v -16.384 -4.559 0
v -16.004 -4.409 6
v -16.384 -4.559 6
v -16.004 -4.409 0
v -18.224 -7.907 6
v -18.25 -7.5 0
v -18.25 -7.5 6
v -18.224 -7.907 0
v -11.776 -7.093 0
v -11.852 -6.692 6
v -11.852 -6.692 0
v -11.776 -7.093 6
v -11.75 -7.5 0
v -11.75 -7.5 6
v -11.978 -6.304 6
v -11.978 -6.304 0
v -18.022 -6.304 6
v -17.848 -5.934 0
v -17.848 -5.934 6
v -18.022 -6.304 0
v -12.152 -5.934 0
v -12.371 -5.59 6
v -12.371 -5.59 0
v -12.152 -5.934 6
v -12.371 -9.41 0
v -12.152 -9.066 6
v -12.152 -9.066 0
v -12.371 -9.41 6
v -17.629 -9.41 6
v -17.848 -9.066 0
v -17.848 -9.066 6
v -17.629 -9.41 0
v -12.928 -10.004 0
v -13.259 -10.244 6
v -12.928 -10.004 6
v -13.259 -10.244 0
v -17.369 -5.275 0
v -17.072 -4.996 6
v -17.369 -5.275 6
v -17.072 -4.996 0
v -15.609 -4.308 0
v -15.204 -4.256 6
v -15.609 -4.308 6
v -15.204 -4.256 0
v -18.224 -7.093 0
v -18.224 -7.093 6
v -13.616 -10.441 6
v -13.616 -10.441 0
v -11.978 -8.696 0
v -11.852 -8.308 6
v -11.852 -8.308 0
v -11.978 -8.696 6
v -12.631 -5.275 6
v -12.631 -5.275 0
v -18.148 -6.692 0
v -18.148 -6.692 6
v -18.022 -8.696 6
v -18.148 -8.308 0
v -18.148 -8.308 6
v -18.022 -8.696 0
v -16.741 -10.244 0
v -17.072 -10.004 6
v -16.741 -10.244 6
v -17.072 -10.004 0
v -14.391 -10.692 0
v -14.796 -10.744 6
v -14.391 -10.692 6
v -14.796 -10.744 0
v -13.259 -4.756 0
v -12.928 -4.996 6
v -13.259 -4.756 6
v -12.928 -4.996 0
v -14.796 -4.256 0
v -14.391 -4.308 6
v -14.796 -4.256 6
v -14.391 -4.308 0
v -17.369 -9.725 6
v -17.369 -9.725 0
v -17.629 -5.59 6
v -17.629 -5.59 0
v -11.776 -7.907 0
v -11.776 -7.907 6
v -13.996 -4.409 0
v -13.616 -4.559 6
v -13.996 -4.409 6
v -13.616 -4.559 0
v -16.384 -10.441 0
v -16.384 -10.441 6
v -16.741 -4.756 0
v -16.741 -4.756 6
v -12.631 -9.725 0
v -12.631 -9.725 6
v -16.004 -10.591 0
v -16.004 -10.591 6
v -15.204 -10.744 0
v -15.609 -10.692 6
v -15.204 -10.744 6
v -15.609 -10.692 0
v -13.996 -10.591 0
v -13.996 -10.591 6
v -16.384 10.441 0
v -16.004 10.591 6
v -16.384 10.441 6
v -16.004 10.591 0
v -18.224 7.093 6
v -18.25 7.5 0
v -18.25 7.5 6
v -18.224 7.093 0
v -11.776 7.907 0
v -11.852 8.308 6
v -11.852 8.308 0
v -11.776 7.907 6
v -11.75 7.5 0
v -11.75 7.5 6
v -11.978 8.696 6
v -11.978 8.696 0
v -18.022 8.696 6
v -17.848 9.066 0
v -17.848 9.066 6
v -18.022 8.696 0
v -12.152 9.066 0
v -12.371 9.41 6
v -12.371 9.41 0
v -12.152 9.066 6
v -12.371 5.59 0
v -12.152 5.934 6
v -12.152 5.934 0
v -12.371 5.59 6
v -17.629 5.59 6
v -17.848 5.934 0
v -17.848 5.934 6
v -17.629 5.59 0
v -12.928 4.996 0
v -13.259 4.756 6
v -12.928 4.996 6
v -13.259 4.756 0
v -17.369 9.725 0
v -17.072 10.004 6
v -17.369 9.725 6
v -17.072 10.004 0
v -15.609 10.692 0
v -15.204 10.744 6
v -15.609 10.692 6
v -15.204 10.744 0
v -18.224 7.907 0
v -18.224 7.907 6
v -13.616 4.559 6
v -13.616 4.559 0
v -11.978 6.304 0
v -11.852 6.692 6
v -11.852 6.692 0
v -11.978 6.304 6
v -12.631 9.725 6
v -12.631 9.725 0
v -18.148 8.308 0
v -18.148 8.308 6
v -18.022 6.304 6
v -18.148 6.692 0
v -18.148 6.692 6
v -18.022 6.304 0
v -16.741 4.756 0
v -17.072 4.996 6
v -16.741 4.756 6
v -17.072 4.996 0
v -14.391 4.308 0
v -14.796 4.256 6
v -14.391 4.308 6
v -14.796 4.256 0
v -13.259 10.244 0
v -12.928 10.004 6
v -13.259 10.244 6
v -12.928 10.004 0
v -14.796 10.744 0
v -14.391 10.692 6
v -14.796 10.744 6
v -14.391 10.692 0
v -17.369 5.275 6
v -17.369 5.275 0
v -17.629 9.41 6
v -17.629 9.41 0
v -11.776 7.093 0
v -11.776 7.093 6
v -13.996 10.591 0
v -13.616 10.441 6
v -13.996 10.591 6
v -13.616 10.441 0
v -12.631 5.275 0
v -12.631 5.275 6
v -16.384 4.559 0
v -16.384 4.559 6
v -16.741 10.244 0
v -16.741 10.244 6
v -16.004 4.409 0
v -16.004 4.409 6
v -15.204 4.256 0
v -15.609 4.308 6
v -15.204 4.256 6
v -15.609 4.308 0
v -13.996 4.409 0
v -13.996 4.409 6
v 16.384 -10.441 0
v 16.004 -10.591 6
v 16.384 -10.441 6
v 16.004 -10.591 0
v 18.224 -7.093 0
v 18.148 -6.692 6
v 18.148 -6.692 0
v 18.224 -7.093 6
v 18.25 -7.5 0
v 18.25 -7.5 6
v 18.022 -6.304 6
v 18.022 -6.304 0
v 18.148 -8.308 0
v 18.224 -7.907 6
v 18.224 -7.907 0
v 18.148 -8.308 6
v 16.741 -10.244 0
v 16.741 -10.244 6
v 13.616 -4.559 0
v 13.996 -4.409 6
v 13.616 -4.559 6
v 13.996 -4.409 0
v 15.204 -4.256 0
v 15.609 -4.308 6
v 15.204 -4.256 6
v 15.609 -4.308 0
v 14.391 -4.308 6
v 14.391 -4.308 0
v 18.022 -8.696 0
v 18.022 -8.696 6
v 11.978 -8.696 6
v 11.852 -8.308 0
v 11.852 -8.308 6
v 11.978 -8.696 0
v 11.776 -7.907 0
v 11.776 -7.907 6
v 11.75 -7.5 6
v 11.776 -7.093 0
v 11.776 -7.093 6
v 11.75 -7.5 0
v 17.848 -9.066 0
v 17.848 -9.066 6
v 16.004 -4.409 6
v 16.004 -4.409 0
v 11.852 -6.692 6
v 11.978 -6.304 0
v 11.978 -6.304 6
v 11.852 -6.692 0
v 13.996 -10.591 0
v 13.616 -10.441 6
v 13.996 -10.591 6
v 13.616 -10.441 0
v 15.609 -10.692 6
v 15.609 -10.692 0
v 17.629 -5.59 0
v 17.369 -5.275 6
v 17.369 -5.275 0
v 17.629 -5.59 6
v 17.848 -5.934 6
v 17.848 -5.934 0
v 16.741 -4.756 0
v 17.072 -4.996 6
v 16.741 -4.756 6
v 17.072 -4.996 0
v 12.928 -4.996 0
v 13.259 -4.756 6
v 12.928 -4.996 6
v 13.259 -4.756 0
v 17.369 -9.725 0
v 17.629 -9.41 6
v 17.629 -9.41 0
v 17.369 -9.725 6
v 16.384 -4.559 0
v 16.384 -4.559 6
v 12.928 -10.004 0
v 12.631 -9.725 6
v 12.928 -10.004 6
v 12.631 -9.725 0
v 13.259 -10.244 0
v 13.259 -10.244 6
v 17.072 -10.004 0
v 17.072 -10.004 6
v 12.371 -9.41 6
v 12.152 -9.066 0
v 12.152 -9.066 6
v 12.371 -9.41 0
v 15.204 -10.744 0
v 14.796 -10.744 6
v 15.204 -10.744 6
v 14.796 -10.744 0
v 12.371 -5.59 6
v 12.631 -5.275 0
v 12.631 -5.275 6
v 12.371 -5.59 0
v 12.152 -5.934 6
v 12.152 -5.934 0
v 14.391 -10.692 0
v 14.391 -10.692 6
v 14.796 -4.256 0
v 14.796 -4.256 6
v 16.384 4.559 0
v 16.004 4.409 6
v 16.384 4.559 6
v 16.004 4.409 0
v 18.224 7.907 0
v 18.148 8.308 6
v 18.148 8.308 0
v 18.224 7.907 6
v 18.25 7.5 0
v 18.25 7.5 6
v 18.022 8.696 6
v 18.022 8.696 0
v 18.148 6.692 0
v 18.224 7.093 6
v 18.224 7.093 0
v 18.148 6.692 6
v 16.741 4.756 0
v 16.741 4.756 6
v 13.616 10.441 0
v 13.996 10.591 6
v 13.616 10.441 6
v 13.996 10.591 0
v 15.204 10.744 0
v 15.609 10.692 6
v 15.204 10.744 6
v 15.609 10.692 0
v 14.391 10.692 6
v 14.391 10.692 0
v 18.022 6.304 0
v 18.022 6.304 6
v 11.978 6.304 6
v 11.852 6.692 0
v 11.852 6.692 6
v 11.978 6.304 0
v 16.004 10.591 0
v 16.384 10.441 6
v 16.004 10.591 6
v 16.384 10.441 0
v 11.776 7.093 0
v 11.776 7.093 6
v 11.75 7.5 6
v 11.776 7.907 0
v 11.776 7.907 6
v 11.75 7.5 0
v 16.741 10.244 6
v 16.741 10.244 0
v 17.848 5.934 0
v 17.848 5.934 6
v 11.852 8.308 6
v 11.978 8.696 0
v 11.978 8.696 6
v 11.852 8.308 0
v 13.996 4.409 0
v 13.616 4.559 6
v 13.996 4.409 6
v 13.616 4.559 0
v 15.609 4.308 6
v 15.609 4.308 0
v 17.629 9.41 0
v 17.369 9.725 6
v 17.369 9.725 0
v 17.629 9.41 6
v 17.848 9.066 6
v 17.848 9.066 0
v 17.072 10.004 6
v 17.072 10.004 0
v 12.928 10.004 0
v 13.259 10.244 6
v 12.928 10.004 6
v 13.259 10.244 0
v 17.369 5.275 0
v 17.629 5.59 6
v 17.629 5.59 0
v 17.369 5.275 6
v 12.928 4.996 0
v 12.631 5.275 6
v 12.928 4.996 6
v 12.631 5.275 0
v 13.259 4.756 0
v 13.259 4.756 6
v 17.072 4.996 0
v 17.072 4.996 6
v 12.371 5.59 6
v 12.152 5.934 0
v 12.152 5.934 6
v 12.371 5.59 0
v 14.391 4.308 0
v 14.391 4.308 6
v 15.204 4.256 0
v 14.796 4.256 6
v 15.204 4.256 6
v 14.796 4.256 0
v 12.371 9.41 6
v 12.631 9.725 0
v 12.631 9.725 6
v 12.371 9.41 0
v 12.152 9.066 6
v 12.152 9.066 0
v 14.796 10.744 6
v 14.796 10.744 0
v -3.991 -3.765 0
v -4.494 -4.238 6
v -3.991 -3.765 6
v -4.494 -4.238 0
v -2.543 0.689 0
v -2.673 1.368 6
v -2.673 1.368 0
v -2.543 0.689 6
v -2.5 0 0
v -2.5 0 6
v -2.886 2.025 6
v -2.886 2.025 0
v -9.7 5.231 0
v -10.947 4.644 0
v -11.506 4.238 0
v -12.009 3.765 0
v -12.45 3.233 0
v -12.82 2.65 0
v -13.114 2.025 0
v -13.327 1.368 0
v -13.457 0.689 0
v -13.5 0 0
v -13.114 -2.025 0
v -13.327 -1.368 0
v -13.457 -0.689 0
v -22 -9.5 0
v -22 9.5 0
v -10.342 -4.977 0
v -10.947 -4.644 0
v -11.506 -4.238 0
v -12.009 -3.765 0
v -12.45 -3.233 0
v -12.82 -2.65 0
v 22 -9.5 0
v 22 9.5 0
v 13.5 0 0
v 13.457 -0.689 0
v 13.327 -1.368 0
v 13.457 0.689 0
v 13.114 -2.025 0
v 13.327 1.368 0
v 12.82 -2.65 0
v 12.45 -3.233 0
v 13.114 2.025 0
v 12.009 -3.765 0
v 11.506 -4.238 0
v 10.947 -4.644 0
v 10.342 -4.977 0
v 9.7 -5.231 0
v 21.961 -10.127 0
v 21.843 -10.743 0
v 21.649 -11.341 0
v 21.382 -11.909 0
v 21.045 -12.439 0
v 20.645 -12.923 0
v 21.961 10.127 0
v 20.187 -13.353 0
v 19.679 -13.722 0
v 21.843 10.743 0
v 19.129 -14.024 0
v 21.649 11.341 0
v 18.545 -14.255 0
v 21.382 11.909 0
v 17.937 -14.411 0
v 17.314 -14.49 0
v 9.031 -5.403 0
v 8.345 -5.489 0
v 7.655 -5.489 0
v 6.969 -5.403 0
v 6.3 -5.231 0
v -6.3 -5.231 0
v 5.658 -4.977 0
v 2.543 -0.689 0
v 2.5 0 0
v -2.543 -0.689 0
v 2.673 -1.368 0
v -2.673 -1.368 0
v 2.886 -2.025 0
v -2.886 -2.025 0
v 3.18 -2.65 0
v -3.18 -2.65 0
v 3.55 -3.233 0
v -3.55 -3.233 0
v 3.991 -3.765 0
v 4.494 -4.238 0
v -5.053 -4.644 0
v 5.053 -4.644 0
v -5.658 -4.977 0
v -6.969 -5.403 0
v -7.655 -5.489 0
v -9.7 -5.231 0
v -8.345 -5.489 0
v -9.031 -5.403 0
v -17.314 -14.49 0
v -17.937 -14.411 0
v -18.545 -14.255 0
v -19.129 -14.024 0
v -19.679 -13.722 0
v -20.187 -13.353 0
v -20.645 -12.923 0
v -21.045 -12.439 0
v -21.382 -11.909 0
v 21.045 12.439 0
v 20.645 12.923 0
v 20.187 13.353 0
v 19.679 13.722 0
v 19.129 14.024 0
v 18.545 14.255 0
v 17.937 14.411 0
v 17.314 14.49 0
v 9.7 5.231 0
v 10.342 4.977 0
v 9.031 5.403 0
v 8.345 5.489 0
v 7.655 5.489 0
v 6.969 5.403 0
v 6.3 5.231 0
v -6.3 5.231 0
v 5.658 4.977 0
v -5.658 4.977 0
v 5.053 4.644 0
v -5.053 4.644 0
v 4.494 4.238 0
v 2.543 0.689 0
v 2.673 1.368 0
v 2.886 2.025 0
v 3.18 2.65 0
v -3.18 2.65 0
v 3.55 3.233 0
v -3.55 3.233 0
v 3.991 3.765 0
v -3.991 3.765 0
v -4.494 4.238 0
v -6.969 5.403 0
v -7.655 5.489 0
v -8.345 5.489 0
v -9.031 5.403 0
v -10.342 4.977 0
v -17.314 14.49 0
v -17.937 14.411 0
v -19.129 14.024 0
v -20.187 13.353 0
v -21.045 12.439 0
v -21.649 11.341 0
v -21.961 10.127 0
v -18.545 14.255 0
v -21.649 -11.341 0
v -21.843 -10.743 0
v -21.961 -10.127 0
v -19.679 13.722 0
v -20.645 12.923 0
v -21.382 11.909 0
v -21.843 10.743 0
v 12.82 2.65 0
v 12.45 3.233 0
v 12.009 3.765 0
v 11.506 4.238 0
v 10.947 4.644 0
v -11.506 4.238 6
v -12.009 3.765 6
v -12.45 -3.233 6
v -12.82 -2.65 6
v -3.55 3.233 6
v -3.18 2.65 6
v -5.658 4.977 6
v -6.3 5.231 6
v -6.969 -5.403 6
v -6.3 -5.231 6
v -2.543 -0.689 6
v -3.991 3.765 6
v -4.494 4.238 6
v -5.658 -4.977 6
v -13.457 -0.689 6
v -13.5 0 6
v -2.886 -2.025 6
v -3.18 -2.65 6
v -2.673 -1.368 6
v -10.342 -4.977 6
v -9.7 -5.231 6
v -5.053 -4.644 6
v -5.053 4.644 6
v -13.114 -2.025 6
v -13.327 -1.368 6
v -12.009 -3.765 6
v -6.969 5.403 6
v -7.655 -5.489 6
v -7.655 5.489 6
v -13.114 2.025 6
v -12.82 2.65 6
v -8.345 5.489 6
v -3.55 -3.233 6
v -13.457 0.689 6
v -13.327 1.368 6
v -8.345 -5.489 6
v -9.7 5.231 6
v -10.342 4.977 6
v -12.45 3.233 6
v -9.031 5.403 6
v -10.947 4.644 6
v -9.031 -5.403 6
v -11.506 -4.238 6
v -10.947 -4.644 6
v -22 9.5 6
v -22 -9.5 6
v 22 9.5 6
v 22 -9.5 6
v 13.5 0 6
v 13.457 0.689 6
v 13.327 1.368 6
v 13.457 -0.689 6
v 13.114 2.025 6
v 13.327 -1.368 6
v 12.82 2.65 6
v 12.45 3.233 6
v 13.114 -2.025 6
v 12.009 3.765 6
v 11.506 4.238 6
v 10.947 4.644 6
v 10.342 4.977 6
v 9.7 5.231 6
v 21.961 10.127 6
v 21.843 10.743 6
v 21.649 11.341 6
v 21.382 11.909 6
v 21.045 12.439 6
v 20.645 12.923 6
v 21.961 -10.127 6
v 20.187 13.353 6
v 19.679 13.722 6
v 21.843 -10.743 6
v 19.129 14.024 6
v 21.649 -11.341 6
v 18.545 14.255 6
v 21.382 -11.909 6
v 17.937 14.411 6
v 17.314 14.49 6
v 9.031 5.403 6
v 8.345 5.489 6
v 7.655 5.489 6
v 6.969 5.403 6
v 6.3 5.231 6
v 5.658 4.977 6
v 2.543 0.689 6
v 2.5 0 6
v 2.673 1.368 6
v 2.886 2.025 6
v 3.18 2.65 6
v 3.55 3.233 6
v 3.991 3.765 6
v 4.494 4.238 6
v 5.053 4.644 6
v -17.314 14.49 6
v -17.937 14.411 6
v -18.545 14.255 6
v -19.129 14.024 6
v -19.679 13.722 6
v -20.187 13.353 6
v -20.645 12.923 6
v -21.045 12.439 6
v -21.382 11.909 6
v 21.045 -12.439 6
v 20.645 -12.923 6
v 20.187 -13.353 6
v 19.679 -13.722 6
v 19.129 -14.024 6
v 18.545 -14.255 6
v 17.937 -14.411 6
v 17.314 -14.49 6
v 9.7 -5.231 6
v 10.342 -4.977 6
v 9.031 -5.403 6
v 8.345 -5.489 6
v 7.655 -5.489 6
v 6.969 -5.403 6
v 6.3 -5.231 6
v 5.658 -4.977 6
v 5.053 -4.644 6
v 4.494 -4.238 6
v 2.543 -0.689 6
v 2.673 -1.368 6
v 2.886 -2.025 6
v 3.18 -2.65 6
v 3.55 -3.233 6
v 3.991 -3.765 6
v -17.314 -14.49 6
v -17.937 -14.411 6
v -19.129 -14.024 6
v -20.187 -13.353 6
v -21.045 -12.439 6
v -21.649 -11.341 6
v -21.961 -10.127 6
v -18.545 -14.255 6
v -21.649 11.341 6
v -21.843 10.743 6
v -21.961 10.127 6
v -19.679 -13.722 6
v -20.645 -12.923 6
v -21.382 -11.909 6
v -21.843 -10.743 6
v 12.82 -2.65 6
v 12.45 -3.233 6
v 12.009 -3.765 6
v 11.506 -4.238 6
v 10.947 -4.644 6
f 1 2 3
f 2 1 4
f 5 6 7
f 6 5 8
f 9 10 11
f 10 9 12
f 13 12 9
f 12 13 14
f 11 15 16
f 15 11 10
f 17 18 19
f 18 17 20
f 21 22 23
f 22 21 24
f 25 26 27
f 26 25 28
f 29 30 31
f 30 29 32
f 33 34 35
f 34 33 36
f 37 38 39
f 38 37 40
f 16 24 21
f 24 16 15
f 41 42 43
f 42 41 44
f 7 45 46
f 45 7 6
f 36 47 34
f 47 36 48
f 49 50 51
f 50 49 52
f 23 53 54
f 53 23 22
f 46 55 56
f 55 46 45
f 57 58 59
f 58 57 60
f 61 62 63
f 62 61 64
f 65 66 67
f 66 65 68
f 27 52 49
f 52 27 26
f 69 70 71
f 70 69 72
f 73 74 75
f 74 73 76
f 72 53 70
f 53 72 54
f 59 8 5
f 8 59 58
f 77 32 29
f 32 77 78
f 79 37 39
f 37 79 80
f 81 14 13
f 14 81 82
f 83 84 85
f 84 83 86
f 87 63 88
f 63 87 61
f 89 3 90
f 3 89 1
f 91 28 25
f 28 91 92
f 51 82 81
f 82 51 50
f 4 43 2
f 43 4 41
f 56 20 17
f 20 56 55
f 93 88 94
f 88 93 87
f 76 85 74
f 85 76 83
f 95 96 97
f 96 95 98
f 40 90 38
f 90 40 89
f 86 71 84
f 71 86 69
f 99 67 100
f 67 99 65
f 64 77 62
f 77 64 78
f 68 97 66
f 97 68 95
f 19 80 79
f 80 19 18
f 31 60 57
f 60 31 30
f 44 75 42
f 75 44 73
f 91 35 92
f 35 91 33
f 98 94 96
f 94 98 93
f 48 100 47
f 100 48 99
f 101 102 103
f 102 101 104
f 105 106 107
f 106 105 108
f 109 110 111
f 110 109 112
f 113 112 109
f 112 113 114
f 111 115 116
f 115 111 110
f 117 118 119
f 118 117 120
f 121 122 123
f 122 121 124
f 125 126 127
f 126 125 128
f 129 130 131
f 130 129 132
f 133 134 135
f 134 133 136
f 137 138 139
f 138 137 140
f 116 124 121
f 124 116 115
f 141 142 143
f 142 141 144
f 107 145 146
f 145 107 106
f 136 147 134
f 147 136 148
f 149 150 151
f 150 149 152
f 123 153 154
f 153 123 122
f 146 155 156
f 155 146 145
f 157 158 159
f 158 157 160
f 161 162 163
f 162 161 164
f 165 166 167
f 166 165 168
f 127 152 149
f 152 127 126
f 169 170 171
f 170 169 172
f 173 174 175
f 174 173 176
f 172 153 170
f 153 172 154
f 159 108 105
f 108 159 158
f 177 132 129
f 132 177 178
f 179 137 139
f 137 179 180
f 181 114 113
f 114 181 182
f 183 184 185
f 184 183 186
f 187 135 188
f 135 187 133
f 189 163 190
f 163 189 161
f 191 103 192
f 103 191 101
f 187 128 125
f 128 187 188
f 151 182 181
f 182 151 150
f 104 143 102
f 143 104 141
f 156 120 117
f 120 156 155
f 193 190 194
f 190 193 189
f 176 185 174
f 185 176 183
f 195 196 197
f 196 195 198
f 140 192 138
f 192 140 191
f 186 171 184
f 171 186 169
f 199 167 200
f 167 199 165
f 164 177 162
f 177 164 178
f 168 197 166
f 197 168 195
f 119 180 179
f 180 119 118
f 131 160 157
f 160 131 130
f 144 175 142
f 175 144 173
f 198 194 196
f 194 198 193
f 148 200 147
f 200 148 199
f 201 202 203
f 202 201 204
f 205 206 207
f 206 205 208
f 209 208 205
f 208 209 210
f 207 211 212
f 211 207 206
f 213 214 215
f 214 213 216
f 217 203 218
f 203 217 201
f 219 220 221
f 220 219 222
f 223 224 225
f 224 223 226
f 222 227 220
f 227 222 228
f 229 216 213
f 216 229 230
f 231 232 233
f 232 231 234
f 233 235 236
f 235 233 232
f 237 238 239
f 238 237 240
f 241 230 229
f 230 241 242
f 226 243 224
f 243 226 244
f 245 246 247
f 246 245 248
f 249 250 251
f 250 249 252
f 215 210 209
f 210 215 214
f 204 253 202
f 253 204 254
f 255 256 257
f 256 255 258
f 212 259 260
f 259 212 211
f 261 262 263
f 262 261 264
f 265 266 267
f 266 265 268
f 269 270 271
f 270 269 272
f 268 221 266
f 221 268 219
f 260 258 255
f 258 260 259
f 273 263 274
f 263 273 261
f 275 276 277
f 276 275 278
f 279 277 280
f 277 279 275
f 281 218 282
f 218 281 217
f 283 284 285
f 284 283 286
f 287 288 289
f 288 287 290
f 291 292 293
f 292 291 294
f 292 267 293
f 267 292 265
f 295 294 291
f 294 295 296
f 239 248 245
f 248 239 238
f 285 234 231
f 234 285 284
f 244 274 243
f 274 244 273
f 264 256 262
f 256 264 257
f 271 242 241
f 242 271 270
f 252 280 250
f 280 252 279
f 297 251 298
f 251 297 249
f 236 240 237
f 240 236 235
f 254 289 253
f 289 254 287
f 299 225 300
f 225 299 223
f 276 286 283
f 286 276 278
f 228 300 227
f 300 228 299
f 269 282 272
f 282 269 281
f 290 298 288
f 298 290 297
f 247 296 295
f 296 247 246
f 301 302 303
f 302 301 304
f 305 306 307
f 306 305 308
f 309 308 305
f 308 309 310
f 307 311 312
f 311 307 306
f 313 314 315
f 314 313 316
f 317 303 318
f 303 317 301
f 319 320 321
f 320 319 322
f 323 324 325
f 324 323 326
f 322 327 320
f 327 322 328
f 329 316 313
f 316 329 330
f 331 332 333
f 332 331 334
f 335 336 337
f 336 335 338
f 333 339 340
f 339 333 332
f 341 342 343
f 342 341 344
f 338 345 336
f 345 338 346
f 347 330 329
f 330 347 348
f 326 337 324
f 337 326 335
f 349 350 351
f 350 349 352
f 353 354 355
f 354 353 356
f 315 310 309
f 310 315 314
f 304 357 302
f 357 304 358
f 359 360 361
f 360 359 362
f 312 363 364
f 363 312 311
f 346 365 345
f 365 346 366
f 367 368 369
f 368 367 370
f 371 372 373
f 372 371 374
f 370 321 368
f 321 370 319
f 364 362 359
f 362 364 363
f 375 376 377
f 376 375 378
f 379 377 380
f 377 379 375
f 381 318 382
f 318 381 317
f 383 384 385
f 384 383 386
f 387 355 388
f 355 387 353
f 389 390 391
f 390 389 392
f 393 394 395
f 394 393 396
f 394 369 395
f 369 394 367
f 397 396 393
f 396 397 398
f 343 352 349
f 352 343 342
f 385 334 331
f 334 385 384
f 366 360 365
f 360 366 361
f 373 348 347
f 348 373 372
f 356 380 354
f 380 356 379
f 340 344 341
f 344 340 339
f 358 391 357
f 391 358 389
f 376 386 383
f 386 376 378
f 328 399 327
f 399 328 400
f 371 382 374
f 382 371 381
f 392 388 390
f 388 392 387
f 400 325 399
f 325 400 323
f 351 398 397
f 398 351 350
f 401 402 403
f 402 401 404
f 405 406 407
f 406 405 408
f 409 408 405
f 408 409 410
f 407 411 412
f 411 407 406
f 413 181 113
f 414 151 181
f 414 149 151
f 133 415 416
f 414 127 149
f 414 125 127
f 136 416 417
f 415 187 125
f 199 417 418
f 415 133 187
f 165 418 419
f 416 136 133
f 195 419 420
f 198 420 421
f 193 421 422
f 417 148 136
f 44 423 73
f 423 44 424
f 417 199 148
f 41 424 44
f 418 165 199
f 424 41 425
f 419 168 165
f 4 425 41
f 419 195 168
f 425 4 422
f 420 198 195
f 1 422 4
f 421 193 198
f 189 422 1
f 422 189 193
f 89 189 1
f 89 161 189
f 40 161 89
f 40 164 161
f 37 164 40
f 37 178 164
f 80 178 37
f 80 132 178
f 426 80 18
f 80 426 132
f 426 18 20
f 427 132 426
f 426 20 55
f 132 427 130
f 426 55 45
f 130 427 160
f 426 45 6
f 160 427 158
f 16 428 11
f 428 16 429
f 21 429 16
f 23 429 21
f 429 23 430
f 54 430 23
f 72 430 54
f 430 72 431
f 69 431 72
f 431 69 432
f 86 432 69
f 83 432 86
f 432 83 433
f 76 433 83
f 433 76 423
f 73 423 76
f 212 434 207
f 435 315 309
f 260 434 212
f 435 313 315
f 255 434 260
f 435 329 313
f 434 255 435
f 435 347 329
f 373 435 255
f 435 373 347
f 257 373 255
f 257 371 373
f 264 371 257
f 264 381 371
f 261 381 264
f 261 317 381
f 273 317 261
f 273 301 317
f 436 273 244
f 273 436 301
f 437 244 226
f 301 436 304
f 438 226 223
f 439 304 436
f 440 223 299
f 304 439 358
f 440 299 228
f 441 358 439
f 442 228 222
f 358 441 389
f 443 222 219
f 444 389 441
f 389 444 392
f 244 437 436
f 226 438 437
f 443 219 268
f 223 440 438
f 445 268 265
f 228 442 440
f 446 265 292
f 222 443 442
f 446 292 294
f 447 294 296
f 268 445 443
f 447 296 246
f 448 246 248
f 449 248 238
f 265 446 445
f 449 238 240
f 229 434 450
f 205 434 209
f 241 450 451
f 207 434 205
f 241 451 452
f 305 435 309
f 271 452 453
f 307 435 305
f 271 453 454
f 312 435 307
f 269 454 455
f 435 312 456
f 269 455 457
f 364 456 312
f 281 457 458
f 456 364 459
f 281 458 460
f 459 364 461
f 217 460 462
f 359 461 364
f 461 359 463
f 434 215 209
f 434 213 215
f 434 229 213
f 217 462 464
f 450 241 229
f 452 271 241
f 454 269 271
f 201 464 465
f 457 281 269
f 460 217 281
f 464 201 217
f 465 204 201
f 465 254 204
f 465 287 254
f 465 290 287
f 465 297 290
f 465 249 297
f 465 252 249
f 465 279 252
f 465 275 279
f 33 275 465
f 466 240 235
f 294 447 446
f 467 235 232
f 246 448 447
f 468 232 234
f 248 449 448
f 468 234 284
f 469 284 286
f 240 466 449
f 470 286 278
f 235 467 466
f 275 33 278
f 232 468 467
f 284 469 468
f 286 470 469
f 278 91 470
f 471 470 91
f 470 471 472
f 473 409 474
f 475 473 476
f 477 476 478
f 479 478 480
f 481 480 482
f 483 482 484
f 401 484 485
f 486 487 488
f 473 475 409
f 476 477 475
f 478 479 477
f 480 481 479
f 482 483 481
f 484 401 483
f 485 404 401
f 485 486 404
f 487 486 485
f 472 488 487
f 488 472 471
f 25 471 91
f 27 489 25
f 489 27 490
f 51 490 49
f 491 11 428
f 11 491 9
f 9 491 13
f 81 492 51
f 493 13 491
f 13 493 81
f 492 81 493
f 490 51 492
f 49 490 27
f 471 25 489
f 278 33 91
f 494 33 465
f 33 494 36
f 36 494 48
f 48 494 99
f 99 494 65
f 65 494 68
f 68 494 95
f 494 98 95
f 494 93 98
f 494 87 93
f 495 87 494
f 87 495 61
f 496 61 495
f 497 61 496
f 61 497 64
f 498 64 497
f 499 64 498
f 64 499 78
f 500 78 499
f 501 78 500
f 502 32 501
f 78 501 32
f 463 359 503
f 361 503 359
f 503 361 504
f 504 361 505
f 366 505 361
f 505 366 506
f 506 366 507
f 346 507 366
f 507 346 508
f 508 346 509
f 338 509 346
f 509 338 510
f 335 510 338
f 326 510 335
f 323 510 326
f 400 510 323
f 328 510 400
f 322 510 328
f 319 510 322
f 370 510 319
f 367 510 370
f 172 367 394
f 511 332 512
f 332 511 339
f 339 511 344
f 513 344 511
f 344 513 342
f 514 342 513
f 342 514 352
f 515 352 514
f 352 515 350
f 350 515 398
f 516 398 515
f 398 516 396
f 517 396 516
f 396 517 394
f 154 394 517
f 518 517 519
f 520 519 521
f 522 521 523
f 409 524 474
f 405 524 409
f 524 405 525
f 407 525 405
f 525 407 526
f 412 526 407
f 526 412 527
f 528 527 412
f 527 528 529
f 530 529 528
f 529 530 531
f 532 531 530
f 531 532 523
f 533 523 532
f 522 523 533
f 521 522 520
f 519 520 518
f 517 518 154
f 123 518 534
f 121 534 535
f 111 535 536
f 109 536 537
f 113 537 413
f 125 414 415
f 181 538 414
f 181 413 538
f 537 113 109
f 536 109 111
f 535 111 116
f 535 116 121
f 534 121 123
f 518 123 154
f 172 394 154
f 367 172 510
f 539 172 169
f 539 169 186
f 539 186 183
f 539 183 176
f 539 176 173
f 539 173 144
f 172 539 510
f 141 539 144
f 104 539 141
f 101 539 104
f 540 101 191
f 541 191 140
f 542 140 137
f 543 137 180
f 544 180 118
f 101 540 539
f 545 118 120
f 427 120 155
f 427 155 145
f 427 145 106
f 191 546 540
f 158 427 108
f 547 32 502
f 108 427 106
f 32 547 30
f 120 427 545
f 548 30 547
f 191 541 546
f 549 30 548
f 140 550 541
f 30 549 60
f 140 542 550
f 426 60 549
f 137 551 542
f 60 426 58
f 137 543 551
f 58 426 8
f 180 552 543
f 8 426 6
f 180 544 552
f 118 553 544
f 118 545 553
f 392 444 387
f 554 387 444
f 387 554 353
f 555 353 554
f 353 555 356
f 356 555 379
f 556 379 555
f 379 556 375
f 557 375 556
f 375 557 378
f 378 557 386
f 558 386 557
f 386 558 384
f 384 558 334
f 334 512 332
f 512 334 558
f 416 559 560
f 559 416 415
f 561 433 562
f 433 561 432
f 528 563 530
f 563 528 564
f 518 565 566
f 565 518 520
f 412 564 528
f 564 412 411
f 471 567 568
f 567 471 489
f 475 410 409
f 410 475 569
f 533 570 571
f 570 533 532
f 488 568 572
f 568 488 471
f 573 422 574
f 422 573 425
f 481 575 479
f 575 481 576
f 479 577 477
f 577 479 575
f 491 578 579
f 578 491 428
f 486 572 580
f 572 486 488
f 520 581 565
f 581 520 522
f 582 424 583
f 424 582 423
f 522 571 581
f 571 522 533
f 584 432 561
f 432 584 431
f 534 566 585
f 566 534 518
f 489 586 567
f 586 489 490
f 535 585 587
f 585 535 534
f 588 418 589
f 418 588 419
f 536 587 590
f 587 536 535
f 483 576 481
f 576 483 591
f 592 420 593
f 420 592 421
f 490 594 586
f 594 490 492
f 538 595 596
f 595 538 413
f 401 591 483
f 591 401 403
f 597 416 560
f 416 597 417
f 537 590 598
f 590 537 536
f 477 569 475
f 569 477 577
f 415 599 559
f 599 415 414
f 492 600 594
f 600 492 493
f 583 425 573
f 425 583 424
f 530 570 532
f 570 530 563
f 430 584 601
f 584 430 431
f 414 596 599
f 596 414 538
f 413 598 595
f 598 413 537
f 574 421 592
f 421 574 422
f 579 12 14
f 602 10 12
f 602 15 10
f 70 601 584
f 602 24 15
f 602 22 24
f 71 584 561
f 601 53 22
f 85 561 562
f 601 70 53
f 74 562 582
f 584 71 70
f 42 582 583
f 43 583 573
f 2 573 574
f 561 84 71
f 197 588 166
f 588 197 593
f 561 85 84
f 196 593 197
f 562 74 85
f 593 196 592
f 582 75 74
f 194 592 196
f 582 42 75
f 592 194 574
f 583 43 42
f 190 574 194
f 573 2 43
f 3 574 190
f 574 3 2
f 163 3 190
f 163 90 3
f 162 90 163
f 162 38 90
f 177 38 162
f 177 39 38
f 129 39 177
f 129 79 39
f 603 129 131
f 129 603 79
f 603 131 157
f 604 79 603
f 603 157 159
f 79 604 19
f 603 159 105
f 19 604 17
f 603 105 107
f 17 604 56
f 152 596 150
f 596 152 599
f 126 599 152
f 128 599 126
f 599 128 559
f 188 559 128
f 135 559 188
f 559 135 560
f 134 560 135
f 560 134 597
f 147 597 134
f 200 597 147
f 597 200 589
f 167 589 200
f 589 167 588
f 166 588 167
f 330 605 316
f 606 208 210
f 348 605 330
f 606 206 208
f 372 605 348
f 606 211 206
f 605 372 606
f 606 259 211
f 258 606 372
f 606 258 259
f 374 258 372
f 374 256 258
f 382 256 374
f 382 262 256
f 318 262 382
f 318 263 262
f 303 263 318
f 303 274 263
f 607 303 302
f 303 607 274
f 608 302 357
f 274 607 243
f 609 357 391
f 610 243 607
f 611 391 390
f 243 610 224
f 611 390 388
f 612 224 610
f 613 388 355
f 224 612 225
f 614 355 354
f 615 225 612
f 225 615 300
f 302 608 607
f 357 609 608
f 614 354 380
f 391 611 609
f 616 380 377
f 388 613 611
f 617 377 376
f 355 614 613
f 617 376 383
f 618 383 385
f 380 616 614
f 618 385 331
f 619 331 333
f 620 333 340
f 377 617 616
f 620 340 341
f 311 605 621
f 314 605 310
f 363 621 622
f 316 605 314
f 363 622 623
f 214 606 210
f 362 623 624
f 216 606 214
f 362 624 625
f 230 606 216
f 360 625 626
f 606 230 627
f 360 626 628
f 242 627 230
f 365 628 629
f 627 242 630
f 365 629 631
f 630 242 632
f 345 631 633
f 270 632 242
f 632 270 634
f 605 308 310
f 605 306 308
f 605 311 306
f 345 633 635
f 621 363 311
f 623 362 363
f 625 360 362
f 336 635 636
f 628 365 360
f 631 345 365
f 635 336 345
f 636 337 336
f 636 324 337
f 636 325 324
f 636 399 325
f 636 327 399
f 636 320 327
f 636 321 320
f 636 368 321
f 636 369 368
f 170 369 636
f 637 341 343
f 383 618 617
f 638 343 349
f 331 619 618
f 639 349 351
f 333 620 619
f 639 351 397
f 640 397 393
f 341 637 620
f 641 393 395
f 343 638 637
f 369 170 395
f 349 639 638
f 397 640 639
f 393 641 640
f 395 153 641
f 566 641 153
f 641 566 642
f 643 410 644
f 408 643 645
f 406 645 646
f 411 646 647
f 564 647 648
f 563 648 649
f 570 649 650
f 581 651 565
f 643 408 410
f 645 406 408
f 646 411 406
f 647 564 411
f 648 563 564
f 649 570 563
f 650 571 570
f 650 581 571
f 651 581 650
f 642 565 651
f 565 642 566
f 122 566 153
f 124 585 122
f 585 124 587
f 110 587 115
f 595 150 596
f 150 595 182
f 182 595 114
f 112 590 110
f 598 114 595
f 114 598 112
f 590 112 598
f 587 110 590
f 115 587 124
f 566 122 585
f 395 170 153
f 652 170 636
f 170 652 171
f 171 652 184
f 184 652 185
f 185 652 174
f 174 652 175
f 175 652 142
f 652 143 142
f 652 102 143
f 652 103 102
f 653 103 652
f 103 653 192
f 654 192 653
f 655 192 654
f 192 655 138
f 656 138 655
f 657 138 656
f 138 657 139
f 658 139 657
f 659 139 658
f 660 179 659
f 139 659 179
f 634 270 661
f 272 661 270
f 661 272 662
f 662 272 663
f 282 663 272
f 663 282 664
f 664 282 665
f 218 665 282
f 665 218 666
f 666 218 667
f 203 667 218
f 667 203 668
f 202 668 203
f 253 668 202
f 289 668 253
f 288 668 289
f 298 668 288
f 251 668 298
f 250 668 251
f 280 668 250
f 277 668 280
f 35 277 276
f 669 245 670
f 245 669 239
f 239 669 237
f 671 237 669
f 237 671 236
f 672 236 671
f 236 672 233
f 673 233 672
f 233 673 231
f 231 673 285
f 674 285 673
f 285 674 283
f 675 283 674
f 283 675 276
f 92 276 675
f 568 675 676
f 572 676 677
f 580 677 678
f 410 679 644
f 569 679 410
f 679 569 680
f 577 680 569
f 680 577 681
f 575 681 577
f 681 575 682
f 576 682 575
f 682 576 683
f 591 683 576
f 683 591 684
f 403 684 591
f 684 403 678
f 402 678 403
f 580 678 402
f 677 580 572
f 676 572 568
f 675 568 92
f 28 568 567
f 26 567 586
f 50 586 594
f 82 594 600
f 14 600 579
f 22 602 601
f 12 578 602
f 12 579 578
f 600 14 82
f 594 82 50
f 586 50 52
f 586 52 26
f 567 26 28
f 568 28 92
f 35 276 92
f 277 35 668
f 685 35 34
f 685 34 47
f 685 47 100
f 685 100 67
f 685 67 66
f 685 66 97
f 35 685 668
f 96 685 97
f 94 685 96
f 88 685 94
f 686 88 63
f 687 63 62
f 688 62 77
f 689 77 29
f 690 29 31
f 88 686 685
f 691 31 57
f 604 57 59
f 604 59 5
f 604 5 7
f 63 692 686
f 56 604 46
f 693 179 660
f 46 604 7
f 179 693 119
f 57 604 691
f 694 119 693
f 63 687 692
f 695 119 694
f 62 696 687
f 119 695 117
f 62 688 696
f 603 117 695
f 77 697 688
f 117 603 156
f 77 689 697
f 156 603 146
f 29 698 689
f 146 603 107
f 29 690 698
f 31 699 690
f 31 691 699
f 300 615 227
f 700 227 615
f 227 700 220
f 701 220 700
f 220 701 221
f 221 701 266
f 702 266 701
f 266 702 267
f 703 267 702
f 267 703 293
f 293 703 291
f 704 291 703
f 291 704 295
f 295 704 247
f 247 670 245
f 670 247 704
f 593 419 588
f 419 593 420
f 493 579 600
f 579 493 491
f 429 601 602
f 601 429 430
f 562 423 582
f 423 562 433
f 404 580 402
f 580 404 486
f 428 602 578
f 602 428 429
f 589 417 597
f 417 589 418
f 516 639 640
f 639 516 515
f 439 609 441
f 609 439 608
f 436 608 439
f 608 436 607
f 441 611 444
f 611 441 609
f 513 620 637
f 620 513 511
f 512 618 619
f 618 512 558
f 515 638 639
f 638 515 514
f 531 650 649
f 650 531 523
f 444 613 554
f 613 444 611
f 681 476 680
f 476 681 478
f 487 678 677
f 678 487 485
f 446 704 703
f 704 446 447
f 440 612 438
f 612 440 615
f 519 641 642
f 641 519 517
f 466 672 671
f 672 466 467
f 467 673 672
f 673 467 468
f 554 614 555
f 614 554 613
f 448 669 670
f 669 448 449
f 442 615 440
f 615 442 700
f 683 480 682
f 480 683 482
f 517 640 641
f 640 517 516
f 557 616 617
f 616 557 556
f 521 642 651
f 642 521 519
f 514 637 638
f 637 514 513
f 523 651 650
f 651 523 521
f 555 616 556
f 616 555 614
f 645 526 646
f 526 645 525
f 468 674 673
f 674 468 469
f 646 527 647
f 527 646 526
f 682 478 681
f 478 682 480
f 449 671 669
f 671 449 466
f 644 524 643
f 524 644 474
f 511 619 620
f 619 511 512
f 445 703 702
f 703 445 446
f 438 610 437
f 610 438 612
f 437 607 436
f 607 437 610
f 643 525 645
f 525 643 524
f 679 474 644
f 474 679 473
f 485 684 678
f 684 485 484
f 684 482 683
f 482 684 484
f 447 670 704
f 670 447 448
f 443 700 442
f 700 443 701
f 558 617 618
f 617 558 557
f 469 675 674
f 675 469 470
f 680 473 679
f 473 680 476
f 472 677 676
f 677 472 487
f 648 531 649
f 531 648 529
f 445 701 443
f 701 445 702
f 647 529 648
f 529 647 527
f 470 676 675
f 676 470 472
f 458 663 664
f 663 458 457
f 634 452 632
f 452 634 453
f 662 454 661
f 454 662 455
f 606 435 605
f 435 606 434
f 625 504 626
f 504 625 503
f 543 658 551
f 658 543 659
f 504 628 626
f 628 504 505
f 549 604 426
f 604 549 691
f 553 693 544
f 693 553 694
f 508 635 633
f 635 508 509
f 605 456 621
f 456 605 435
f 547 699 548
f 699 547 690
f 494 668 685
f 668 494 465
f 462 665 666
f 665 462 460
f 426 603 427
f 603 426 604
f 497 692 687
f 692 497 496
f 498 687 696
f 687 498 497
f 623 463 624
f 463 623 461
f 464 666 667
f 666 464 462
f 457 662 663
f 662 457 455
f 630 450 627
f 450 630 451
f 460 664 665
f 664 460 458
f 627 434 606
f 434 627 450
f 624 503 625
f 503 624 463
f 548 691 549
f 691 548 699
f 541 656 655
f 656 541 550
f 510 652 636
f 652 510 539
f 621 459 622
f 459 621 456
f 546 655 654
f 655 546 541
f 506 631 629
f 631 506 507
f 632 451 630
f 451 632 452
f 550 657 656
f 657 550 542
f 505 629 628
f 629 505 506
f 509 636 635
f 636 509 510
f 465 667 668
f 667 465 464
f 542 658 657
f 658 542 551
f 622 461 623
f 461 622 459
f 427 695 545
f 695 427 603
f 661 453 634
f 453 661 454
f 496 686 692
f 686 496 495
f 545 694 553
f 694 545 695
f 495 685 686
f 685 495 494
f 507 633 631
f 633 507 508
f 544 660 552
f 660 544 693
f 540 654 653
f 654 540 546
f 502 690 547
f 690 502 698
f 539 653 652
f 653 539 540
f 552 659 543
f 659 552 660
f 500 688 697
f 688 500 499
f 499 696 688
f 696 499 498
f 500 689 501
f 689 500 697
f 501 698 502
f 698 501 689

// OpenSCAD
$fn = 50;

difference() {
	union() {
		hull() {
			translate(v = [-17.0, 9.5, 0]) {
				cylinder(h = 6, r = 5);
			}
			translate(v = [17.0, 9.5, 0]) {
				cylinder(h = 6, r = 5);
			}
			translate(v = [-17.0, -9.5, 0]) {
				cylinder(h = 6, r = 5);
			}
			translate(v = [17.0, -9.5, 0]) {
				cylinder(h = 6, r = 5);
			}
		}
	}
	union() {
		translate(v = [-15.0, -7.5, -100.0]) {
			cylinder(h = 200, r = 3.25);
		}
		translate(v = [-15.0, 7.5, -100.0]) {
			cylinder(h = 200, r = 3.25);
		}
		translate(v = [15.0, -7.5, -100.0]) {
			cylinder(h = 200, r = 3.25);
		}
		translate(v = [15.0, 7.5, -100.0]) {
			cylinder(h = 200, r = 3.25);
		}
		translate(v = [-15.0, -7.5, -100.0]) {
			cylinder(h = 200, r = 1.8);
		}
		translate(v = [-15.0, 7.5, -100.0]) {
			cylinder(h = 200, r = 1.8);
		}
		translate(v = [15.0, -7.5, -100.0]) {
			cylinder(h = 200, r = 1.8);
		}
		translate(v = [15.0, 7.5, -100.0]) {
			cylinder(h = 200, r = 1.8);
		}
		translate(v = [-8.0, 0, 0.0]) {
			cylinder(h = 6, r = 5.5);
		}
		translate(v = [8.0, 0, 0.0]) {
			cylinder(h = 6, r = 5.5);
		}
	}
}
